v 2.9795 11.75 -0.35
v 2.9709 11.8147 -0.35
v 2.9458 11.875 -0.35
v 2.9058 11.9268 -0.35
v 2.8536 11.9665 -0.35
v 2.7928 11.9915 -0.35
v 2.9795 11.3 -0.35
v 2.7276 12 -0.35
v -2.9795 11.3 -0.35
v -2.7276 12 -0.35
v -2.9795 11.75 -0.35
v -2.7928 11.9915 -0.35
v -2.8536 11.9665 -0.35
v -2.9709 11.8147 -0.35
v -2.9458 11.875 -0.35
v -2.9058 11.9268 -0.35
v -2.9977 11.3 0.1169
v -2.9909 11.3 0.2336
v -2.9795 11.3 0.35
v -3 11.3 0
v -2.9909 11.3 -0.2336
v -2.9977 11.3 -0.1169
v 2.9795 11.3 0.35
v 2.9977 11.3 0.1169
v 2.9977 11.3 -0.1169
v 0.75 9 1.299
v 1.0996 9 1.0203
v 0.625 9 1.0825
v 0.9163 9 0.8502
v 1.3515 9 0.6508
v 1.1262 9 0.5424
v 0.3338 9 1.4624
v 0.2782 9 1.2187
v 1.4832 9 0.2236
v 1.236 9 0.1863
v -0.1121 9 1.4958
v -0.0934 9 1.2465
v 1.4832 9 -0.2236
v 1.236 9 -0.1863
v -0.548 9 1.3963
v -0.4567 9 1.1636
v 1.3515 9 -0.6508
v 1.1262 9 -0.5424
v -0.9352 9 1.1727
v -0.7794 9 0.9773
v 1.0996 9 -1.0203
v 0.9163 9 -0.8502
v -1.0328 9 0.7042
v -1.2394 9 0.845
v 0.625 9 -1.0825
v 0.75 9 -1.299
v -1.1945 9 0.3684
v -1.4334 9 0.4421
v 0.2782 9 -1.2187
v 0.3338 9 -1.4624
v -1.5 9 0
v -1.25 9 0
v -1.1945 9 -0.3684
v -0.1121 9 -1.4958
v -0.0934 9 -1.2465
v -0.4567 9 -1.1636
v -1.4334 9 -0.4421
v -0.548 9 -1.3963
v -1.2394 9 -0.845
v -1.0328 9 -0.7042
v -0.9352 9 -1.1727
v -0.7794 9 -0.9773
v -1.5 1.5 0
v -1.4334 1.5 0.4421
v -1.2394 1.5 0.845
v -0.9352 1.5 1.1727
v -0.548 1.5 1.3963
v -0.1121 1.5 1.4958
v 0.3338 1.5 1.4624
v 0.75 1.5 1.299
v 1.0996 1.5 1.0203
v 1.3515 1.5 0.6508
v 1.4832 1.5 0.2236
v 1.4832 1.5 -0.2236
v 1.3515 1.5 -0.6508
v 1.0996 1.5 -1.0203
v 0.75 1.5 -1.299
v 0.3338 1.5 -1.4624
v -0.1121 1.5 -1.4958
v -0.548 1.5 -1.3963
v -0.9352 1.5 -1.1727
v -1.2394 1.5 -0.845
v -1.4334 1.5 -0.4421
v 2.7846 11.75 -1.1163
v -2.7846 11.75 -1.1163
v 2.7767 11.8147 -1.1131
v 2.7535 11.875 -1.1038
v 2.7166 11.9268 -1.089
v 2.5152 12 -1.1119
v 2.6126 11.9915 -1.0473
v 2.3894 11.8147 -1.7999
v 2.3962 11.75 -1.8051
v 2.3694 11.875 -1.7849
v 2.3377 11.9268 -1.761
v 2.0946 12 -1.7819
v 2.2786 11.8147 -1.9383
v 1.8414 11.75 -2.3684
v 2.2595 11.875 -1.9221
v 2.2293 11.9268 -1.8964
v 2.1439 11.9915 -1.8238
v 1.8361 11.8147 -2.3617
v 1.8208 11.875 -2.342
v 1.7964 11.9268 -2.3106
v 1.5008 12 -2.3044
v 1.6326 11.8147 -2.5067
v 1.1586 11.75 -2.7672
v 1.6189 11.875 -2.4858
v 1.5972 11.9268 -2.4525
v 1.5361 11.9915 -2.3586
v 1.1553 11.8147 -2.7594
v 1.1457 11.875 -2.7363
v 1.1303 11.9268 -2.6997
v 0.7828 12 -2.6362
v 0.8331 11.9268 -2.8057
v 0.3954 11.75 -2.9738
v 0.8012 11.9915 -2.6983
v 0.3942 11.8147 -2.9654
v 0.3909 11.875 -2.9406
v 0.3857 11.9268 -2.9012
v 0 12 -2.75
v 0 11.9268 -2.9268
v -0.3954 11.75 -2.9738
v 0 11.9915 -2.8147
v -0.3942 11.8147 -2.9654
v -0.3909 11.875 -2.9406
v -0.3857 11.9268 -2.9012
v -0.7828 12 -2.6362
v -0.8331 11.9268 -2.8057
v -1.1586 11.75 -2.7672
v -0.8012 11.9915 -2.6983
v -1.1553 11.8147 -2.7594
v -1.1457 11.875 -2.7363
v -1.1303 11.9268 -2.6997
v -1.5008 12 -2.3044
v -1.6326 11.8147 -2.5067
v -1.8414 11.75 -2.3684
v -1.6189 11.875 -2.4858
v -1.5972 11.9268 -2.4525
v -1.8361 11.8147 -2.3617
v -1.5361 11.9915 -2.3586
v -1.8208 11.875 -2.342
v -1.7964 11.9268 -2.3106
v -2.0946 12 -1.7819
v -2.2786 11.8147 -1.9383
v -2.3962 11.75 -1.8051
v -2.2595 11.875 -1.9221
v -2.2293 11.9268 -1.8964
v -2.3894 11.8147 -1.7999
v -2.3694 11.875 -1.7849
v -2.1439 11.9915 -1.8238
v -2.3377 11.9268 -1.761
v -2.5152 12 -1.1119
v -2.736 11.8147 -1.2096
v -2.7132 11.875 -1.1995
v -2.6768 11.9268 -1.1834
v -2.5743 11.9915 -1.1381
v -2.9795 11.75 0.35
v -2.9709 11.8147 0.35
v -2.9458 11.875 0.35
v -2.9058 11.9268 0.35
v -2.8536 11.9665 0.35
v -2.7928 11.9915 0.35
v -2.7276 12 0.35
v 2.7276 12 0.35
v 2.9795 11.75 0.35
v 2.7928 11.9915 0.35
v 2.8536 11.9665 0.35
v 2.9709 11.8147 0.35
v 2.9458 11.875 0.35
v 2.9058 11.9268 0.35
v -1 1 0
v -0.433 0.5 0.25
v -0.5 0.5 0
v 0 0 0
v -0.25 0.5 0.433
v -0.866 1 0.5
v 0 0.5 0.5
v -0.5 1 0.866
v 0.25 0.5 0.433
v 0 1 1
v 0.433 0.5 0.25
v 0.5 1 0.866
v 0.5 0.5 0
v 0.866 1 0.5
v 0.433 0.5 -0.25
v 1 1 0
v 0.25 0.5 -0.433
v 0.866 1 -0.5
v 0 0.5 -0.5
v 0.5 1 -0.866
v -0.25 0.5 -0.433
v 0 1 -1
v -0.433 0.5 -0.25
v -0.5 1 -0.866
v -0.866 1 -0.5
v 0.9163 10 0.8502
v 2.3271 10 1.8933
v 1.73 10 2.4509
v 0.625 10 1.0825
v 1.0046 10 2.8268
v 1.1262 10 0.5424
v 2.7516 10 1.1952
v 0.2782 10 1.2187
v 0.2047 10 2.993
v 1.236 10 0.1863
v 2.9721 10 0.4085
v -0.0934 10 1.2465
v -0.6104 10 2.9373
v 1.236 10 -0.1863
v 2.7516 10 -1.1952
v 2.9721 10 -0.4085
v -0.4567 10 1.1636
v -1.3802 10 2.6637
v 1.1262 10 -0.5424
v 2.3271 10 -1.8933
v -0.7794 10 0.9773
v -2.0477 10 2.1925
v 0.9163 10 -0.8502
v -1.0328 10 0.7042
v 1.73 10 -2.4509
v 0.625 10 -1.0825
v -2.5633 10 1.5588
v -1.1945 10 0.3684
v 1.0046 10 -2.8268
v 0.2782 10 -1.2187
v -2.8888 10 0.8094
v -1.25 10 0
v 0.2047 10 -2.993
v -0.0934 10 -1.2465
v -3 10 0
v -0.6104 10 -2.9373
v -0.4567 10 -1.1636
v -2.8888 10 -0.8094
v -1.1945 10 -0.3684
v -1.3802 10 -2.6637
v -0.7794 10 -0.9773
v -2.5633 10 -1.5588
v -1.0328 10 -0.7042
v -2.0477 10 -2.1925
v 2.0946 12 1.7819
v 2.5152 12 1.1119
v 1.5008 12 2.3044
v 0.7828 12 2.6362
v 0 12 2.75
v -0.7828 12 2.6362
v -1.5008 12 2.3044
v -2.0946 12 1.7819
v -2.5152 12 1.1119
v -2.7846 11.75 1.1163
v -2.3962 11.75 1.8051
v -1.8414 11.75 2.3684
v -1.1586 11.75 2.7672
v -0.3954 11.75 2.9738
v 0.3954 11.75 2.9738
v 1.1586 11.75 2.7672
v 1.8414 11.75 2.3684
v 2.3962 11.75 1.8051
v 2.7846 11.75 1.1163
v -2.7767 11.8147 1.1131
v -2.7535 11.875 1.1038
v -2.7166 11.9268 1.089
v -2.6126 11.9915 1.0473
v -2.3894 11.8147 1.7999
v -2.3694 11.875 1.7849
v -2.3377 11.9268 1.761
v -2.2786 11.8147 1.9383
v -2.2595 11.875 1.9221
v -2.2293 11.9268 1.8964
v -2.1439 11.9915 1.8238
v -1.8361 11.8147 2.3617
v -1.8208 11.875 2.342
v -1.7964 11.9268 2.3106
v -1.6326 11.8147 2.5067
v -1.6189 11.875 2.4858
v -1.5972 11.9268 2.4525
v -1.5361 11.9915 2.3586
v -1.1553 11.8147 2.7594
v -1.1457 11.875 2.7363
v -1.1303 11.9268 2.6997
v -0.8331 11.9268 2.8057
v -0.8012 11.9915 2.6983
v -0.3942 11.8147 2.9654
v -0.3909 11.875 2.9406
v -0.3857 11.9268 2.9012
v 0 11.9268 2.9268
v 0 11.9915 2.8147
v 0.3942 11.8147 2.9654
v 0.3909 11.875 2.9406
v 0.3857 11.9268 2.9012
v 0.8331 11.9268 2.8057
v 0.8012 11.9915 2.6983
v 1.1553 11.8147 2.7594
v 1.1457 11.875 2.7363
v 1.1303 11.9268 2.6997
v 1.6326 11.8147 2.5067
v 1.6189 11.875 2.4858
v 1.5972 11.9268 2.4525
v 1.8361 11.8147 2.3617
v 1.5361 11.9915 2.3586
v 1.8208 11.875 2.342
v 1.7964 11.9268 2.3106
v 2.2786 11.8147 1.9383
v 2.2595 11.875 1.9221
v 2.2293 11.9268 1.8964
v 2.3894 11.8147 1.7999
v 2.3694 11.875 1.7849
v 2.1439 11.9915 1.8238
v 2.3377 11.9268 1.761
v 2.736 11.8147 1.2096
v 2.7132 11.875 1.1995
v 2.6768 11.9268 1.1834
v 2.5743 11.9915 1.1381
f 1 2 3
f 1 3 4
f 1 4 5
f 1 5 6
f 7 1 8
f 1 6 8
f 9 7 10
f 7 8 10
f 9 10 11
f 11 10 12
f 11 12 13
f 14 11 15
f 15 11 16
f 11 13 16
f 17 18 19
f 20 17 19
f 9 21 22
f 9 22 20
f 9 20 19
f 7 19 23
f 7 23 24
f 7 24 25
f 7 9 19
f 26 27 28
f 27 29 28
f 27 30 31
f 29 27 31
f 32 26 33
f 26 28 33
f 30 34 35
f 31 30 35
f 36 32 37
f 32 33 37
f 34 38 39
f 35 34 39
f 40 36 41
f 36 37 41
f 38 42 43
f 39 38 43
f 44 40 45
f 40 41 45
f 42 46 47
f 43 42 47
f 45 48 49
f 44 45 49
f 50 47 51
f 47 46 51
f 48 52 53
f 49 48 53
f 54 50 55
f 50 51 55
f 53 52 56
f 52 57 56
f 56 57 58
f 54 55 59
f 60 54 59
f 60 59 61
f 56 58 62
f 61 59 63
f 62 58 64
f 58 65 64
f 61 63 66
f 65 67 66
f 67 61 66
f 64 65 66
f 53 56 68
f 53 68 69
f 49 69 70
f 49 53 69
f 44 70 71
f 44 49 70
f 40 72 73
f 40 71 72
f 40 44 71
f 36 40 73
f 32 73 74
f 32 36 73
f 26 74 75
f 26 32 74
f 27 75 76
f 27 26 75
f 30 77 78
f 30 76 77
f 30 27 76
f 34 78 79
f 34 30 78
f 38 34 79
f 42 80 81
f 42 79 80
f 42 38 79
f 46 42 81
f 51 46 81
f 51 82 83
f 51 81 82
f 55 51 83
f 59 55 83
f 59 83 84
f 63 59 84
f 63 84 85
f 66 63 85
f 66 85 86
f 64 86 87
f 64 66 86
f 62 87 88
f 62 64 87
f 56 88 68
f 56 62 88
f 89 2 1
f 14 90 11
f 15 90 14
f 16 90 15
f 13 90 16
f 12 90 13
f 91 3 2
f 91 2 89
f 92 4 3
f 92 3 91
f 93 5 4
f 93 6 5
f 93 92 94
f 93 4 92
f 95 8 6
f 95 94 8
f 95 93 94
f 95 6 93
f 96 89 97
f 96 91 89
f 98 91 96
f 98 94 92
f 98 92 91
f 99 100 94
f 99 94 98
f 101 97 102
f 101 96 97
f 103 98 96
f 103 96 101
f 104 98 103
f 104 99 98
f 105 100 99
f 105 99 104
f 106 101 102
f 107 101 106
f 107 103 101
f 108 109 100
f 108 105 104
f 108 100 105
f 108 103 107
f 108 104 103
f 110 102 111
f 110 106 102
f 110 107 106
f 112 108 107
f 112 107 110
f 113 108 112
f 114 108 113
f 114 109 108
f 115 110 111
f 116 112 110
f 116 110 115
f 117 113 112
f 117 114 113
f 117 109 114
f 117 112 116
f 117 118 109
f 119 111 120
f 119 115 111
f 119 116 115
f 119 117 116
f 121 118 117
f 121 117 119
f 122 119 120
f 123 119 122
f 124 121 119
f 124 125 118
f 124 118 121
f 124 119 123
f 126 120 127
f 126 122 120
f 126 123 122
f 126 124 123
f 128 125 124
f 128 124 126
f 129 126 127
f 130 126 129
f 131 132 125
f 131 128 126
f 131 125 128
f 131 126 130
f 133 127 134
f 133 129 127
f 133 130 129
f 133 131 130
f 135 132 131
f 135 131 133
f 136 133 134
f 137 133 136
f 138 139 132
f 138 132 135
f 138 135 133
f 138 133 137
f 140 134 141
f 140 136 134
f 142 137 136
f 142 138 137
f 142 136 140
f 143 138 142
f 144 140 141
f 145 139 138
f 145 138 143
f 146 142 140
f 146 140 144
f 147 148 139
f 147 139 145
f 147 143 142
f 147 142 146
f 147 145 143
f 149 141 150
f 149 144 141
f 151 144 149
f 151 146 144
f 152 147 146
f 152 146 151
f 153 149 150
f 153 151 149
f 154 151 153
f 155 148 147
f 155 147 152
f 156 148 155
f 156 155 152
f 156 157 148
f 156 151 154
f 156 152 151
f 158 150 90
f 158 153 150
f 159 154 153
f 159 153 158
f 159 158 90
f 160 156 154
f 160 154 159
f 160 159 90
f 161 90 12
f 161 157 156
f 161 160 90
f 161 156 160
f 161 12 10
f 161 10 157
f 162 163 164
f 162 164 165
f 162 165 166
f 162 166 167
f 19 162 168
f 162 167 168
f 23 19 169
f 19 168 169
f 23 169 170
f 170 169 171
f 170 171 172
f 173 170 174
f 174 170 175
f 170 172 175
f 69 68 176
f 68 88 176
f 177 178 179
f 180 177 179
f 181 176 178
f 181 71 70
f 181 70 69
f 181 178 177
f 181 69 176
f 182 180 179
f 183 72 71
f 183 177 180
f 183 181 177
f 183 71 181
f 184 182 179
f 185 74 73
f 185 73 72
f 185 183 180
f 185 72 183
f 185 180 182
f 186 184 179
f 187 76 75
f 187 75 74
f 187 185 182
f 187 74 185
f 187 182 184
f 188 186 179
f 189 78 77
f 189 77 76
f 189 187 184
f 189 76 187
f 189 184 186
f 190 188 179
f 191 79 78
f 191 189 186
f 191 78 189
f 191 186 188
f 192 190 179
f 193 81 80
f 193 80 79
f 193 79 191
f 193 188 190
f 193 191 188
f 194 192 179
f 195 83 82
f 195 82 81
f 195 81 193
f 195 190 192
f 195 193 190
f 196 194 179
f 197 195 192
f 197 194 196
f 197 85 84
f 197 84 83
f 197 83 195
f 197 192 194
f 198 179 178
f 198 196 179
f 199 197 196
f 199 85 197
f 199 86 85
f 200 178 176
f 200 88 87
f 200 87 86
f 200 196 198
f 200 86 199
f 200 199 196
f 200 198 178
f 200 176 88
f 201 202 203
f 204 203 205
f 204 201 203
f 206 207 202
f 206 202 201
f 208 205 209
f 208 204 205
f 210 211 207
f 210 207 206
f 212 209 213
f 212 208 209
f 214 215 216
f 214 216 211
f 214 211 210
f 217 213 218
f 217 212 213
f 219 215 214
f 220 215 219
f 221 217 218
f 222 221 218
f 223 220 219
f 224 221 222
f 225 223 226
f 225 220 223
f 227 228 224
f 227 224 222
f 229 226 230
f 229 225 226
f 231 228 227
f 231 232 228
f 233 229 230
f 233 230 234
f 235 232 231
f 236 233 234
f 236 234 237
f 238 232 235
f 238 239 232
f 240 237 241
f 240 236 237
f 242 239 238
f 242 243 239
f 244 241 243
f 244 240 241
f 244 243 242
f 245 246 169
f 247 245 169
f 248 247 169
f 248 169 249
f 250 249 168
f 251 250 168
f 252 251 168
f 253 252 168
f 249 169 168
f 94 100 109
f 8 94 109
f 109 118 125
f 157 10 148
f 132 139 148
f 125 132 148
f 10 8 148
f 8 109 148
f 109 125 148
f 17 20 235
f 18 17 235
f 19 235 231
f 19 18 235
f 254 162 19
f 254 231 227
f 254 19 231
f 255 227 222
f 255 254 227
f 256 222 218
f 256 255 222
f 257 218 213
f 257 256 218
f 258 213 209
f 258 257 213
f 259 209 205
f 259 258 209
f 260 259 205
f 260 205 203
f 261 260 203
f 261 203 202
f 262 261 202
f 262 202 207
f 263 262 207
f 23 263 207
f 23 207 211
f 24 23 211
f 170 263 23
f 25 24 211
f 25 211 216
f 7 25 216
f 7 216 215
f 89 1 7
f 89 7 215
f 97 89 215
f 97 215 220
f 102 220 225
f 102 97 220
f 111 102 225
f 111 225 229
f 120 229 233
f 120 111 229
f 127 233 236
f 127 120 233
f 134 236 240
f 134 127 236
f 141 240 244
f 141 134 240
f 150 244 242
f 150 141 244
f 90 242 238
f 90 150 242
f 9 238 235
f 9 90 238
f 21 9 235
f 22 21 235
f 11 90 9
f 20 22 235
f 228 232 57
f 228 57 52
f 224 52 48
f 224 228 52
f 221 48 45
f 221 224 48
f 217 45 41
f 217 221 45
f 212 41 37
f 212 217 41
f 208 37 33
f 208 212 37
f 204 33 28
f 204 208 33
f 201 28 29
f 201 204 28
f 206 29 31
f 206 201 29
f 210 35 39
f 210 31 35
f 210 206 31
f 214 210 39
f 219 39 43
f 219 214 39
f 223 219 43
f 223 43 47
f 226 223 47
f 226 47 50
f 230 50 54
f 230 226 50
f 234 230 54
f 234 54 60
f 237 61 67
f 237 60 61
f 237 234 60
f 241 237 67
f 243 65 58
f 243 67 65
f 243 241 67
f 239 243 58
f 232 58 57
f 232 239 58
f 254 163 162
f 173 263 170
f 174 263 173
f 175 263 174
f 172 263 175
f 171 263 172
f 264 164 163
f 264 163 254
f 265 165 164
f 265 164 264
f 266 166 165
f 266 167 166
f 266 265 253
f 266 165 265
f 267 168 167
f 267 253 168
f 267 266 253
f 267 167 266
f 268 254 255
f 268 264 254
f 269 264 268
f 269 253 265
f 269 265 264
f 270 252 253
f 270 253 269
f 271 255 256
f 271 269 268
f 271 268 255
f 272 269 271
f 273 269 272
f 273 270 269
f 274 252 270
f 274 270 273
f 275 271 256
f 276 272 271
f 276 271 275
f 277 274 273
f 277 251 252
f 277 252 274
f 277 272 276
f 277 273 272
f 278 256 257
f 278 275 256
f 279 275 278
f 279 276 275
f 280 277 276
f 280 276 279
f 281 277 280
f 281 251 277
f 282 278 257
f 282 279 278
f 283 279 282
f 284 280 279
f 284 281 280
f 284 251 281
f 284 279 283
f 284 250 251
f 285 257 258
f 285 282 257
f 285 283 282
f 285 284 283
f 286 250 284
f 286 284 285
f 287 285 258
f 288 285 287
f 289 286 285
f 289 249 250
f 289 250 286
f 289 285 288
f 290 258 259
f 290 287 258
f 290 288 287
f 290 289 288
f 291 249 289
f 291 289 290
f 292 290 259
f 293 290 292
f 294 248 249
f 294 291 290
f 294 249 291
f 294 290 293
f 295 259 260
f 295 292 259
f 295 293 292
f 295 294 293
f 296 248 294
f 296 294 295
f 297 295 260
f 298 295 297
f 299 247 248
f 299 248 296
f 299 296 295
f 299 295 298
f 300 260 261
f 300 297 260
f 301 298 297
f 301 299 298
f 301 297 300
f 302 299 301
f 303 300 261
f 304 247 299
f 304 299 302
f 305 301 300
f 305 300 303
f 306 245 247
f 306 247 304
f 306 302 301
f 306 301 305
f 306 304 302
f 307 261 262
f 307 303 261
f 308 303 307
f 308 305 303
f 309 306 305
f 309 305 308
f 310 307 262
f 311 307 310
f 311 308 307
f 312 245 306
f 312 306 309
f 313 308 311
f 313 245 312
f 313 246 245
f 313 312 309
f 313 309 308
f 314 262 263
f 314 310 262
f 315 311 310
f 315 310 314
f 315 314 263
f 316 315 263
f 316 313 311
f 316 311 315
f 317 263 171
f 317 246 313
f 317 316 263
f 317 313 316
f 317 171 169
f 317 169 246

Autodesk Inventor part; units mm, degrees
ref_plane "YZ Plane" through (0, 0, 0) normal (1, 0, 0) x (0, 1, 0)
ref_plane "XZ Plane" through (0, 0, 0) normal (0, 1, 0) x (-1, 0, 0)
ref_plane "XY Plane" through (0, 0, 0) normal (0, 0, 1) x (1, 0, 0)
sketch "Sketch1" plane through (0, 0, 0) normal (0, 0, 1) x (1, 0, 0)
  line L0 (0, 0) -> (-1.5, 1.5)
  line L1 (-1.5, 1.5) -> (-1.5, 9)
  line L2 (-1.5, 9) -> (-1.25, 9)
  line L3 (-1.25, 9) -> (-1.25, 10)
  line L4 (-1.25, 10) -> (-3, 10)
  line L5 (-3, 10) -> (-3, 12)
  line L6 (-3, 12) -> (0, 12)
  line L7 (0, 12) -> (0, 0)
  dimension "d0" = 2
  dimension "d1" = 3
  dimension "d2" = 1.5
  dimension "d3" = 0.25
  dimension "d4" = 1
  dimension "d5" = 12
  dimension "d6" = 45
revolve "Revolution1" add sketch "Sketch1" angle 360 about axis through (0, 12, 0) along (0, -1, 0)
thread "Thread1" size "M3x0.35" class "6g" standard "ANSI Metric M Profile" length 27
sketch "Sketch2" plane through (0, 12, 0) normal (0, 1, 0) x (1, 0, 0)
  line L0 (5, 0.35) -> (-5, 0.35)
  line L1 (-5, 0.35) -> (-5, -0.35)
  line L2 (-5, -0.35) -> (5, -0.35)
  line L3 (5, -0.35) -> (5, 0.35)
  line L4 (5, 0.35) -> (-5, -0.35) construction
  line L5 (-5, 0.35) -> (5, -0.35) construction
  point P0 (0, 0)
  dimension "d10" = 10
  dimension "d11" = 0.7
fillet "Fillet1" radius 0.25 1 edges at (3, 12, 0)
extrude "Extrusion2" cut sketch "Sketch2" against normal blind 0.7
properties part number "Screw-M3-Fine-GapSet-2" material "Brass, Soft Yellow"
